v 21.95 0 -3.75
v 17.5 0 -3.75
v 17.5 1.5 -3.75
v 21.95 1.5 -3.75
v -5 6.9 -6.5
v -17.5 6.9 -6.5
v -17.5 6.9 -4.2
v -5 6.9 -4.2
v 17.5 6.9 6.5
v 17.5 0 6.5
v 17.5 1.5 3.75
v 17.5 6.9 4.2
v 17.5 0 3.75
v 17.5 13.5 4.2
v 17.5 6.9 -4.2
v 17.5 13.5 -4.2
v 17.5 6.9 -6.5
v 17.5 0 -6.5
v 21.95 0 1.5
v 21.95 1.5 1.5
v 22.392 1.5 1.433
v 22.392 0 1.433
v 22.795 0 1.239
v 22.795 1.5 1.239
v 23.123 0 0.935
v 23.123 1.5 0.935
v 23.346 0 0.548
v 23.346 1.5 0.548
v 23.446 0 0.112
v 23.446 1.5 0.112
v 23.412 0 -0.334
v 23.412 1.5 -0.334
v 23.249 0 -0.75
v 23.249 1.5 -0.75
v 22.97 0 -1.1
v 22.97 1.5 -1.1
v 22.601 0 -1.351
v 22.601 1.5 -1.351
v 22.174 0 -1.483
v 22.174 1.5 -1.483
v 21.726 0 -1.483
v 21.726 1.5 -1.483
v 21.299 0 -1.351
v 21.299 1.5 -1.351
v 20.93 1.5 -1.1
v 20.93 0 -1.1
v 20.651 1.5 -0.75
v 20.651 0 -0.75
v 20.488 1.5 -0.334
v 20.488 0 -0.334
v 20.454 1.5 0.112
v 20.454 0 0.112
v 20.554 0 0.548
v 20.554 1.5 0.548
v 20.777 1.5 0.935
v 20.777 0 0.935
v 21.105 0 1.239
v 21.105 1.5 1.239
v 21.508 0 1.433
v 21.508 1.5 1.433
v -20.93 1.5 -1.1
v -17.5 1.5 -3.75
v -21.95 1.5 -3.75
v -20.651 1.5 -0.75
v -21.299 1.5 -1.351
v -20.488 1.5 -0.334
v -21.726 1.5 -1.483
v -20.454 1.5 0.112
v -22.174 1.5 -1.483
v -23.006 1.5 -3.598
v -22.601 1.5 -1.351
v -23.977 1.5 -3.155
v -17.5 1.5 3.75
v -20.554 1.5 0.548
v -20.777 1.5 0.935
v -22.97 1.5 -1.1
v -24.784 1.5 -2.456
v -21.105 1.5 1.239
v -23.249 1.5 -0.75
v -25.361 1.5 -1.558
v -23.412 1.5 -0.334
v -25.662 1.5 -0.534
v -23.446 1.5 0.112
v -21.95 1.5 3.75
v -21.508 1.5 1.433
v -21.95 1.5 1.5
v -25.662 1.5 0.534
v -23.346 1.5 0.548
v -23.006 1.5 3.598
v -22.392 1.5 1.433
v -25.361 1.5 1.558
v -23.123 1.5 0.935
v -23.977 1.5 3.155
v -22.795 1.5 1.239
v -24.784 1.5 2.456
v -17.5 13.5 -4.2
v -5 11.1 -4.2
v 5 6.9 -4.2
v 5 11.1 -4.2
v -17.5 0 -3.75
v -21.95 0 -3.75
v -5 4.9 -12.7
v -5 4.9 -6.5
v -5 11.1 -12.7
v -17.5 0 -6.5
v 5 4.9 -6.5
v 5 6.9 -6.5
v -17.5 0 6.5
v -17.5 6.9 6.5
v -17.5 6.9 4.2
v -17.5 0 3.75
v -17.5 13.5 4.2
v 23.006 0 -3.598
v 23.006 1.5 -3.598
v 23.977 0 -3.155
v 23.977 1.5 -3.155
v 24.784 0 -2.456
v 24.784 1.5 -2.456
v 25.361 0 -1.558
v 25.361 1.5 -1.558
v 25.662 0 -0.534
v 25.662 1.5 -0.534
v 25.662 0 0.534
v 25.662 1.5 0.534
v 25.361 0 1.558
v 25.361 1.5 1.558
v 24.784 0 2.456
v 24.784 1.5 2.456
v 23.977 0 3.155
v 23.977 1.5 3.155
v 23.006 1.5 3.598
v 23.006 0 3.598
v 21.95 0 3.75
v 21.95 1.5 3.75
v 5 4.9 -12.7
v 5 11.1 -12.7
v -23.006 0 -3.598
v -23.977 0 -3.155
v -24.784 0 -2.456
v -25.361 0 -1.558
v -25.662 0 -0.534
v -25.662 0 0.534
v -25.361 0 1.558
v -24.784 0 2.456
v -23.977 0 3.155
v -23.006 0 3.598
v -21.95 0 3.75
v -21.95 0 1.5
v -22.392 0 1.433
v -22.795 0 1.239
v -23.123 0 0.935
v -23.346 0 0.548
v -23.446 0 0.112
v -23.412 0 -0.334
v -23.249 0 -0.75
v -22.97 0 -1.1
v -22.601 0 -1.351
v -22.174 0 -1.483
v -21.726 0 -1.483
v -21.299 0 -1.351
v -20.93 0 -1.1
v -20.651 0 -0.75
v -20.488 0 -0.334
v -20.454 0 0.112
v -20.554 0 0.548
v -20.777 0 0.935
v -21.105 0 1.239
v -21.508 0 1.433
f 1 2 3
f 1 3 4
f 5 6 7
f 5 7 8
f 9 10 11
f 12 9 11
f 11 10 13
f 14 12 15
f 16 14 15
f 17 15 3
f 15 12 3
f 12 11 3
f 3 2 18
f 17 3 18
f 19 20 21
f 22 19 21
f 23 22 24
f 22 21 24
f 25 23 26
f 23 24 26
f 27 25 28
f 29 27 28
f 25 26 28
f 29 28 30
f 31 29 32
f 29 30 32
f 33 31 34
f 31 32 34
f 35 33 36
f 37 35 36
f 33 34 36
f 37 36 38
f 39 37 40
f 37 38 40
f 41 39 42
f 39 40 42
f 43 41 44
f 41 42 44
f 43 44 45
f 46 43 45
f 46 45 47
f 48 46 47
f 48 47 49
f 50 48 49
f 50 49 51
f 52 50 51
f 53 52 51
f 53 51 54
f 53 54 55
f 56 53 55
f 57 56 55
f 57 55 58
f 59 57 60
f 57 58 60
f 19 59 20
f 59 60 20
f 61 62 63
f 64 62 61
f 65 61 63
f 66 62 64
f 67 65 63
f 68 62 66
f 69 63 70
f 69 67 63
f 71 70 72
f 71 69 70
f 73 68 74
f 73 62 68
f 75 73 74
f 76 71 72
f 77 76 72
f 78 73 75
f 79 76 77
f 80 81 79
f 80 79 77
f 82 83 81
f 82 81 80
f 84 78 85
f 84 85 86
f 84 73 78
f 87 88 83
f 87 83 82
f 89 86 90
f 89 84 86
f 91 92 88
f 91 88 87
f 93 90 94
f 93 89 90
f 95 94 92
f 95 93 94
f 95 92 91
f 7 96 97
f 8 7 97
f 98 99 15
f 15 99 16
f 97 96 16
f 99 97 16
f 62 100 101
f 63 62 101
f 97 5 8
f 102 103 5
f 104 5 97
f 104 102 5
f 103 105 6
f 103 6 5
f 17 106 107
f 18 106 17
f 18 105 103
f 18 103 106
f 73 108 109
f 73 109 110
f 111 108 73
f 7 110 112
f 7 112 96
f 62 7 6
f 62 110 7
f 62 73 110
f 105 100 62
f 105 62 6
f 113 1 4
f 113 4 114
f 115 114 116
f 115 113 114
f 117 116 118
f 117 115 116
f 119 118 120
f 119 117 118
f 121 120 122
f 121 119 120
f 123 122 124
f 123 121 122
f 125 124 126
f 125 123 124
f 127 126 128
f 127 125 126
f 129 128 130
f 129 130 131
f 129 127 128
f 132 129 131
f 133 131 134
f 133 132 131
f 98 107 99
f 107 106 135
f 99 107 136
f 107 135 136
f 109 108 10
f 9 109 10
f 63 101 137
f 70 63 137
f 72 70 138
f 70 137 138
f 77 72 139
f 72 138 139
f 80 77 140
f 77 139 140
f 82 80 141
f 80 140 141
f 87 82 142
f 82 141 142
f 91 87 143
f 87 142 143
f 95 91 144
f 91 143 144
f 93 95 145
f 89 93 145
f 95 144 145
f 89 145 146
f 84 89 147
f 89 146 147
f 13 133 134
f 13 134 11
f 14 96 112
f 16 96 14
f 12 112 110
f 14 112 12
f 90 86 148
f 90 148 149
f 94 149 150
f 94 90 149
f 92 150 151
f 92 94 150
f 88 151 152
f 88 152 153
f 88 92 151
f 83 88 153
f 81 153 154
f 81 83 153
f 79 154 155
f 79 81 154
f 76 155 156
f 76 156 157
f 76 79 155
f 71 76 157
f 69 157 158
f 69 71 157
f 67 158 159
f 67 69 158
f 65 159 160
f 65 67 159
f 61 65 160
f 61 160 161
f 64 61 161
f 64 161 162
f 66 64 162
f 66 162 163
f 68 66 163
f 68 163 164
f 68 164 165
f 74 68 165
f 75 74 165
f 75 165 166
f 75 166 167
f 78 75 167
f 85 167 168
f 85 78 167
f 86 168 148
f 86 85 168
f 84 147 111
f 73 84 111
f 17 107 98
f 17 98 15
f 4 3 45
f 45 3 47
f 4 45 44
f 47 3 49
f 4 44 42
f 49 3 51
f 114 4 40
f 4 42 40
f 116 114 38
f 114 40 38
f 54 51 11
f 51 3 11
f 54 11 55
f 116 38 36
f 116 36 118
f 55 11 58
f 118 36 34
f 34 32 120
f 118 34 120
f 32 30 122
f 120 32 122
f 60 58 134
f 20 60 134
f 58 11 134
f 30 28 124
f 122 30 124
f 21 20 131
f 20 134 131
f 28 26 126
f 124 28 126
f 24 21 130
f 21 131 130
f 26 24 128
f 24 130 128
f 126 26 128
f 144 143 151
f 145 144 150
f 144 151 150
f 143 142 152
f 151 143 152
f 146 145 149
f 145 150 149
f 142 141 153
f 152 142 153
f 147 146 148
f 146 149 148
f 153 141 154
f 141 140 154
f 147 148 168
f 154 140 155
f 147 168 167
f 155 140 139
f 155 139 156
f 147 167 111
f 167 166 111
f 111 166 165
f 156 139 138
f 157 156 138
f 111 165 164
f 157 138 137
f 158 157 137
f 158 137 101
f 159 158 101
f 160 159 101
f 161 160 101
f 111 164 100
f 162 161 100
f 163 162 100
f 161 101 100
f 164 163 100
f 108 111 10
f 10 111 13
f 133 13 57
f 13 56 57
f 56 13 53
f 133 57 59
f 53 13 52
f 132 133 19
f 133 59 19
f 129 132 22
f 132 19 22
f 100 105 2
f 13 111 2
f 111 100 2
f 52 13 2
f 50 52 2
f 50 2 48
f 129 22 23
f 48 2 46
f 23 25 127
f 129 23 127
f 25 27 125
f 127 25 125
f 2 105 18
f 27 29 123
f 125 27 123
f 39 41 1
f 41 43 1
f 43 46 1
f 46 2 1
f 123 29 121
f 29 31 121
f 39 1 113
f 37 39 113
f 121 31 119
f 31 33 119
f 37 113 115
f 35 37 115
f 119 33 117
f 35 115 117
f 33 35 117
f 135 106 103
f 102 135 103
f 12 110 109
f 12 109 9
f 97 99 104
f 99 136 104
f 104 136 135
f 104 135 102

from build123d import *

# Parameters (mm, degrees)
SKETCH1_W           = 35
SKETCH1_H           = 13
BOSS_EXTRUDE1_DEPTH = 13.5
BOSS_EXTRUDE2_DEPTH = 1.5
BOSS_EXTRUDE3_DEPTH = 1.5
SKETCH4_R           = 1.5
CUT_EXTRUDE1_DEPTH  = 1.5
SKETCH5_W           = 35
SKETCH5_H           = 2.3
CUT_EXTRUDE2_DEPTH  = 6.6
SKETCH6_W           = 10
SKETCH6_H           = 6.2
BOSS_EXTRUDE4_DEPTH = 6.2
SKETCH6_2_W         = 10
SKETCH6_2_H         = 6.2
BOSS_EXTRUDE5_DEPTH = 2.3


with BuildPart() as part:
    # Sketch1 → Boss-Extrude1 (new body)
    with BuildSketch(Plane(origin=(0, 0, 0), x_dir=(1, 0, 0), z_dir=(0, 1, 0))):
        Rectangle(SKETCH1_W, SKETCH1_H)
    extrude(amount=BOSS_EXTRUDE1_DEPTH)

    # Sketch2 → Boss-Extrude2 (add)
    with BuildSketch(Plane.XZ):
        with BuildLine():
            Line((17.5, 3.75), (17.5, -3.75))
            Line((17.5, -3.75), (21.95, -3.75))
            ThreePointArc((21.95, -3.75), (25.7, 0), (21.95, 3.75))
            Line((21.95, 3.75), (17.5, 3.75))
        make_face()
    extrude(amount=-BOSS_EXTRUDE2_DEPTH)

    # Sketch3 → Boss-Extrude3 (add)
    with BuildSketch(Plane.XZ):
        with BuildLine():
            Line((-17.5, 3.75), (-17.5, -3.75))
            Line((-17.5, -3.75), (-21.95, -3.75))
            ThreePointArc((-21.95, -3.75), (-25.7, 0), (-21.95, 3.75))
            Line((-21.95, 3.75), (-17.5, 3.75))
        make_face()
    extrude(amount=-BOSS_EXTRUDE3_DEPTH)

    # Sketch4 → Cut-Extrude1 (cut)
    with BuildSketch(Plane(origin=(0, 1.5, 0), x_dir=(1, 0, 0), z_dir=(0, 1, 0))):
        with Locations(Location((21.95, 0, 0), (0, 0, 270))):
            Circle(SKETCH4_R)
    cut_extrude1 = extrude(amount=-CUT_EXTRUDE1_DEPTH, mode=Mode.SUBTRACT)

    # Mirror1: Cut-Extrude1 across plane
    add(cut_extrude1.mirror(Plane(origin=(0, 0, 0), x_dir=(0, 0, 1), z_dir=(1, 0, 0))), mode=Mode.SUBTRACT)

    # Sketch5 → Cut-Extrude2 (cut)
    with BuildSketch(Plane(origin=(0, 13.5, 0), x_dir=(1, 0, 0), z_dir=(0, 1, 0))):
        with Locations((0, 5.35)):
            Rectangle(SKETCH5_W, SKETCH5_H)
        with Locations((0, -5.35)):
            Rectangle(SKETCH5_W, SKETCH5_H)
    extrude(amount=-CUT_EXTRUDE2_DEPTH, mode=Mode.SUBTRACT)

    # Sketch6 → Boss-Extrude4 (add)
    with BuildSketch(Plane(origin=(0, 0, -6.5), x_dir=(-1, 0, 0), z_dir=(0, 0, -1))):
        with Locations((0, 8)):
            Rectangle(SKETCH6_W, SKETCH6_H)
    extrude(amount=BOSS_EXTRUDE4_DEPTH)

    # Sketch6<2> → Boss-Extrude5 (add)
    with BuildSketch(Plane(origin=(0, 0, -6.5), x_dir=(-1, 0, 0), z_dir=(0, 0, -1))):
        with Locations((0, 8)):
            Rectangle(SKETCH6_2_W, SKETCH6_2_H)
    extrude(amount=-BOSS_EXTRUDE5_DEPTH)


solid = part.part
